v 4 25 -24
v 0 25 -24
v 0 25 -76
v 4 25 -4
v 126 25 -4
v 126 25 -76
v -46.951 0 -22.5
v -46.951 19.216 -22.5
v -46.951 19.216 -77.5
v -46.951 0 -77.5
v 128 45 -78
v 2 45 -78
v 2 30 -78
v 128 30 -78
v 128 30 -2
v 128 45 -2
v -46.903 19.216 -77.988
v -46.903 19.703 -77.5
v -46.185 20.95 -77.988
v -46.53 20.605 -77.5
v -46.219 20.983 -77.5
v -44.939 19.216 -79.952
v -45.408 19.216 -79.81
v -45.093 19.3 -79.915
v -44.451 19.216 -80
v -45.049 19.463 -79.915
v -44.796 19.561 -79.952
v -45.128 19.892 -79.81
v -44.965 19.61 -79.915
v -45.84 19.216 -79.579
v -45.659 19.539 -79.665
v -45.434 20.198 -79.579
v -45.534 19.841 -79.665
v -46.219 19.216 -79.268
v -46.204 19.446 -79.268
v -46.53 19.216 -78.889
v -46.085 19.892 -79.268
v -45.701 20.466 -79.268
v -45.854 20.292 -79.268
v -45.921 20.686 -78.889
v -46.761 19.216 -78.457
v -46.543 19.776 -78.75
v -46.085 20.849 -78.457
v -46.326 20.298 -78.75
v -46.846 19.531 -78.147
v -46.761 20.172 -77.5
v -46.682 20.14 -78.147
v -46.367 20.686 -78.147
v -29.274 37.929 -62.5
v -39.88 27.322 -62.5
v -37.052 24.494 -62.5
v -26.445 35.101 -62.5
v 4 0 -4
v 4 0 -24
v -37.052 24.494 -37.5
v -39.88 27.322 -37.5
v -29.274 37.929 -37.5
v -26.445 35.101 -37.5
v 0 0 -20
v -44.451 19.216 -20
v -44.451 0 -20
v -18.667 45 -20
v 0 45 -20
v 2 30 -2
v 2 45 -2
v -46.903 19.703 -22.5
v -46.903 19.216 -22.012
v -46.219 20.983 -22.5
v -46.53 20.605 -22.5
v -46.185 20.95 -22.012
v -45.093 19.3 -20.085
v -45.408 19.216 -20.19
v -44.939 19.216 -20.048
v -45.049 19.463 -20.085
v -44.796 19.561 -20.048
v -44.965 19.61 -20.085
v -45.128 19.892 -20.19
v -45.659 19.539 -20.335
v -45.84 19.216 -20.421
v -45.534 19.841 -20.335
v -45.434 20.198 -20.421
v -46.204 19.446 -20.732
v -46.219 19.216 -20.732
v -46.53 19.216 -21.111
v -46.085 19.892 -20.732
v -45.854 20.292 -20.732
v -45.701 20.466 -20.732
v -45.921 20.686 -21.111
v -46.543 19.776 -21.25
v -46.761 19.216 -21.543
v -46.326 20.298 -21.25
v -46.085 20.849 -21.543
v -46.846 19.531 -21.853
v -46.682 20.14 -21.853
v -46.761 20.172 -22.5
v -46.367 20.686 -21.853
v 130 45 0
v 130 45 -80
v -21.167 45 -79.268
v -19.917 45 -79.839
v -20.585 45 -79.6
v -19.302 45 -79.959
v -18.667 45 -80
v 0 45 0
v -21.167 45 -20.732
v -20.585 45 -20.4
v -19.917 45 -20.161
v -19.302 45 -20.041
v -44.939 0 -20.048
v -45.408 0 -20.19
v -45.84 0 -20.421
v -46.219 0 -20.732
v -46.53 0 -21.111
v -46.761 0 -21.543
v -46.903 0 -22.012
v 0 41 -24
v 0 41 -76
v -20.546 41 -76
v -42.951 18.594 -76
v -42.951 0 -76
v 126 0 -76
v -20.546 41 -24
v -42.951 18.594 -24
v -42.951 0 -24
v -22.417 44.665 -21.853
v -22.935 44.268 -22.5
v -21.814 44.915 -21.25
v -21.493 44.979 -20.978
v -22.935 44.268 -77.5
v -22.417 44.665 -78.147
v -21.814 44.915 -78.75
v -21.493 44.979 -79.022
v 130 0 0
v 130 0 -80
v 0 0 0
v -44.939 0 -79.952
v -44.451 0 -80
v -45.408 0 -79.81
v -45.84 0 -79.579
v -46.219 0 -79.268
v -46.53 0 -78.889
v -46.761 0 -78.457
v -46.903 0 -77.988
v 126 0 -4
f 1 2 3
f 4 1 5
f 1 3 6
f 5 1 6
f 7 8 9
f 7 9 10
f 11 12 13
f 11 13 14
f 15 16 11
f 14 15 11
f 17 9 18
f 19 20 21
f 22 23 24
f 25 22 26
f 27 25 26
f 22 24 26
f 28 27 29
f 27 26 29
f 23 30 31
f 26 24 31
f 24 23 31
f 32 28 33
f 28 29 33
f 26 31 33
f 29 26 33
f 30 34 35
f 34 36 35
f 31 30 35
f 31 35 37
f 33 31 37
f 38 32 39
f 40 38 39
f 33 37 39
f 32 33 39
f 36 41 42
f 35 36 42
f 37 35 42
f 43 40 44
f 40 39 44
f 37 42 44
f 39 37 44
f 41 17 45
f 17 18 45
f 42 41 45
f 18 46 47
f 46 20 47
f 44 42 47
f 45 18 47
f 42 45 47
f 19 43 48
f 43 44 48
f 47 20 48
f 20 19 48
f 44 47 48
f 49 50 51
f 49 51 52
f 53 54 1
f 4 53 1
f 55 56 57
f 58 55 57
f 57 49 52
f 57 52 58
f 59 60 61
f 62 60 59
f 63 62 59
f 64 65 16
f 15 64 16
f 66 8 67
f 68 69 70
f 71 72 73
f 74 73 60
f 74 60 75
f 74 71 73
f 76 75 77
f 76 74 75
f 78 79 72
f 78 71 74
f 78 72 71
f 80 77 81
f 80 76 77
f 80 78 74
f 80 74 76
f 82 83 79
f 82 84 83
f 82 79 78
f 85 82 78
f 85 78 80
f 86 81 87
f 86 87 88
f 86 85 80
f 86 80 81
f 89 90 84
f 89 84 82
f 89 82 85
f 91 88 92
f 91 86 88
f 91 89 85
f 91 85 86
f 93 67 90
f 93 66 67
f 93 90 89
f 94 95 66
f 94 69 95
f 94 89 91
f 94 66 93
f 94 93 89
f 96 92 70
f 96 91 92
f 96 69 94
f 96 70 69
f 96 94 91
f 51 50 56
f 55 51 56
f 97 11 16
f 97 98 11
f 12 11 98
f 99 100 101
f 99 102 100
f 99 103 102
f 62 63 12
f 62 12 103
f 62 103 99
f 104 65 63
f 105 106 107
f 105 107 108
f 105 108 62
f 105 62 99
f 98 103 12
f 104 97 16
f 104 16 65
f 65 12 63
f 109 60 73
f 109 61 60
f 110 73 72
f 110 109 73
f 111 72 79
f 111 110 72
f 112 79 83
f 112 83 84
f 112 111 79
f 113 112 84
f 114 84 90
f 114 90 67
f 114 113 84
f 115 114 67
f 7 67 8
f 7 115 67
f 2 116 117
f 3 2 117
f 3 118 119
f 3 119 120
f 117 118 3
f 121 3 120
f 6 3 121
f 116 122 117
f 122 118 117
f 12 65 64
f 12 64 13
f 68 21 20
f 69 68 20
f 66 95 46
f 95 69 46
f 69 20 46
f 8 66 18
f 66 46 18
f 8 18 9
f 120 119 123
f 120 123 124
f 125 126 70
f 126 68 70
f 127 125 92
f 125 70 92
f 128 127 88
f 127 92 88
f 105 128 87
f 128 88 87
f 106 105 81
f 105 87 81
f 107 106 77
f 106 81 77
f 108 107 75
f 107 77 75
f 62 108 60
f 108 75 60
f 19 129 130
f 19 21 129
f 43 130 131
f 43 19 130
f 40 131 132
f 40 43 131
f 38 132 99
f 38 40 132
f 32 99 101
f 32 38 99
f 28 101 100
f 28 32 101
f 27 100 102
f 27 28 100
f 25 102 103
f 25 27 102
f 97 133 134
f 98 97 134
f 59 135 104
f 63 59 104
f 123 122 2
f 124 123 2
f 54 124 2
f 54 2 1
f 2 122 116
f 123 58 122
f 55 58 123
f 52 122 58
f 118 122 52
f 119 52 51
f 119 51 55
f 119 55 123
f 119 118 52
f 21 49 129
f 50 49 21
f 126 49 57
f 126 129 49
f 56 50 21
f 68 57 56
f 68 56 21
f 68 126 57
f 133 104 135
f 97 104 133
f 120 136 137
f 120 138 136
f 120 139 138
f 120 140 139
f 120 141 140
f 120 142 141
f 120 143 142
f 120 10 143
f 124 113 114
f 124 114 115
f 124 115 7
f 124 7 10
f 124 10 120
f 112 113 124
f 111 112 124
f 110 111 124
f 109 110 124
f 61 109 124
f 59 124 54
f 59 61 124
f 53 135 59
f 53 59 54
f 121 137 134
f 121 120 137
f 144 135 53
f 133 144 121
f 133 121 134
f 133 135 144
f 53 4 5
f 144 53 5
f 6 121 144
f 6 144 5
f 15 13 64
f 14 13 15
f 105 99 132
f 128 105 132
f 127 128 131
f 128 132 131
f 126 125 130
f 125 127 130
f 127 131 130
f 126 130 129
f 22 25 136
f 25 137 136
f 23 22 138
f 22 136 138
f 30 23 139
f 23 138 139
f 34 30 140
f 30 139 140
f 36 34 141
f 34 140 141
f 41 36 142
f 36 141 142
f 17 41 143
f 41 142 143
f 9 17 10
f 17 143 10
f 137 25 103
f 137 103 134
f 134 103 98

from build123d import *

# Parameters (mm, degrees)
SKETCH1_W           = 130
SKETCH1_H           = 80
BOSS_EXTRUDE1_DEPTH = 45
BOSS_EXTRUDE3_DEPTH = 80
CUT_EXTRUDE1_DEPTH  = 20
FILLET2_R           = 2.5
SHELL2_START        = -76
SHELL2_OUTLINE_W    = 122
SHELL2_OUTLINE_H    = 41
SHELL2_DEPTH        = 72
SHELL2_2_DEPTH      = 52
SKETCH9_W           = 130
SKETCH9_H           = 80
BOSS_EXTRUDE7_DEPTH = 20
SKETCH9_3_W         = 126
SKETCH9_3_H         = 76
CUT_EXTRUDE3_DEPTH  = 15
SKETCH10_W          = 25
SKETCH10_H          = 15
CUT_EXTRUDE4_DEPTH  = 15


# Read off the part's stored shape, not the designer's step: Shell2
with BuildPart() as part:
    # Sketch1 → Boss-Extrude1 (new body)
    with BuildSketch(Plane(origin=(0, 0, 0), x_dir=(1, 0, 0), z_dir=(0, 1, 0))):
        with Locations((65, 40)):
            Rectangle(SKETCH1_W, SKETCH1_H)
    extrude(amount=BOSS_EXTRUDE1_DEPTH)

    # Sketch3 → Boss-Extrude3 (add)
    with BuildSketch(Plane.XY):
        Polygon((0, 0), (0, 45), (-22.202683057, 45), (-46.951420398, 20.251262658), (-46.951420398, 0), align=None)
    extrude(amount=-BOSS_EXTRUDE3_DEPTH)

    # Sketch3<4> → Cut-Extrude1 (cut)
    with BuildSketch(Plane.XY):
        Polygon((0, 0), (0, 45), (-22.202683057, 45), (-46.951420398, 20.251262658), (-46.951420398, 0), align=None)
    extrude(amount=-CUT_EXTRUDE1_DEPTH, mode=Mode.SUBTRACT)

    # Fillet2
    fillet2_edges = [part.edges().sort_by_distance(p)[0] for p in [
        (-34.577051727, 32.625631329, -80),
        (-22.202683057, 45, -50),
        (-46.951420398, 20.251262658, -50),
        (-46.951420398, 10.125631329, -80),
        (-46.951420398, 10.125631329, -20),
        (-34.577051727, 32.625631329, -20),
    ]]
    fillet(fillet2_edges, radius=FILLET2_R)

    # Shell2 outline → Shell2 (cut)
    with BuildSketch(Plane.XY.offset(SHELL2_START)):
        with Locations((65, 20.5)):
            Rectangle(SHELL2_OUTLINE_W, SHELL2_OUTLINE_H)
    extrude(amount=SHELL2_DEPTH, mode=Mode.SUBTRACT)

    # Shell2 2 outline → Shell2 2 (cut)
    with BuildSketch(Plane.XY.offset(SHELL2_START)):
        Polygon((-20.545828807, 41), (-42.951420398, 18.594408409), (-42.951420398, 0), (4, 0), (4, 41), align=None)
    extrude(amount=SHELL2_2_DEPTH, mode=Mode.SUBTRACT)

    # Sketch9 → Boss-Extrude7 (add)
    with BuildSketch(Plane(origin=(0, 45, 0), x_dir=(1, 0, 0), z_dir=(0, 1, 0))):
        with Locations((65, 40)):
            Rectangle(SKETCH9_W, SKETCH9_H)
    extrude(amount=-BOSS_EXTRUDE7_DEPTH)

    # Sketch9<3> → Cut-Extrude3 (cut)
    with BuildSketch(Plane(origin=(0, 45, 0), x_dir=(1, 0, 0), z_dir=(0, 1, 0))):
        with Locations((65, 40)):
            Rectangle(SKETCH9_3_W, SKETCH9_3_H)
    extrude(amount=-CUT_EXTRUDE3_DEPTH, mode=Mode.SUBTRACT)

    # Sketch10 → Cut-Extrude4 (cut)
    with BuildSketch(Plane(origin=(-33.601341528, 33.601341528, 0), x_dir=(0, 0, 1), z_dir=(-0.7071067811865477, 0.7071067811865475, 0))):
        with Locations((-50, -1.379862597)):
            Rectangle(SKETCH10_W, SKETCH10_H)
    extrude(amount=-CUT_EXTRUDE4_DEPTH, mode=Mode.SUBTRACT)


solid = part.part
